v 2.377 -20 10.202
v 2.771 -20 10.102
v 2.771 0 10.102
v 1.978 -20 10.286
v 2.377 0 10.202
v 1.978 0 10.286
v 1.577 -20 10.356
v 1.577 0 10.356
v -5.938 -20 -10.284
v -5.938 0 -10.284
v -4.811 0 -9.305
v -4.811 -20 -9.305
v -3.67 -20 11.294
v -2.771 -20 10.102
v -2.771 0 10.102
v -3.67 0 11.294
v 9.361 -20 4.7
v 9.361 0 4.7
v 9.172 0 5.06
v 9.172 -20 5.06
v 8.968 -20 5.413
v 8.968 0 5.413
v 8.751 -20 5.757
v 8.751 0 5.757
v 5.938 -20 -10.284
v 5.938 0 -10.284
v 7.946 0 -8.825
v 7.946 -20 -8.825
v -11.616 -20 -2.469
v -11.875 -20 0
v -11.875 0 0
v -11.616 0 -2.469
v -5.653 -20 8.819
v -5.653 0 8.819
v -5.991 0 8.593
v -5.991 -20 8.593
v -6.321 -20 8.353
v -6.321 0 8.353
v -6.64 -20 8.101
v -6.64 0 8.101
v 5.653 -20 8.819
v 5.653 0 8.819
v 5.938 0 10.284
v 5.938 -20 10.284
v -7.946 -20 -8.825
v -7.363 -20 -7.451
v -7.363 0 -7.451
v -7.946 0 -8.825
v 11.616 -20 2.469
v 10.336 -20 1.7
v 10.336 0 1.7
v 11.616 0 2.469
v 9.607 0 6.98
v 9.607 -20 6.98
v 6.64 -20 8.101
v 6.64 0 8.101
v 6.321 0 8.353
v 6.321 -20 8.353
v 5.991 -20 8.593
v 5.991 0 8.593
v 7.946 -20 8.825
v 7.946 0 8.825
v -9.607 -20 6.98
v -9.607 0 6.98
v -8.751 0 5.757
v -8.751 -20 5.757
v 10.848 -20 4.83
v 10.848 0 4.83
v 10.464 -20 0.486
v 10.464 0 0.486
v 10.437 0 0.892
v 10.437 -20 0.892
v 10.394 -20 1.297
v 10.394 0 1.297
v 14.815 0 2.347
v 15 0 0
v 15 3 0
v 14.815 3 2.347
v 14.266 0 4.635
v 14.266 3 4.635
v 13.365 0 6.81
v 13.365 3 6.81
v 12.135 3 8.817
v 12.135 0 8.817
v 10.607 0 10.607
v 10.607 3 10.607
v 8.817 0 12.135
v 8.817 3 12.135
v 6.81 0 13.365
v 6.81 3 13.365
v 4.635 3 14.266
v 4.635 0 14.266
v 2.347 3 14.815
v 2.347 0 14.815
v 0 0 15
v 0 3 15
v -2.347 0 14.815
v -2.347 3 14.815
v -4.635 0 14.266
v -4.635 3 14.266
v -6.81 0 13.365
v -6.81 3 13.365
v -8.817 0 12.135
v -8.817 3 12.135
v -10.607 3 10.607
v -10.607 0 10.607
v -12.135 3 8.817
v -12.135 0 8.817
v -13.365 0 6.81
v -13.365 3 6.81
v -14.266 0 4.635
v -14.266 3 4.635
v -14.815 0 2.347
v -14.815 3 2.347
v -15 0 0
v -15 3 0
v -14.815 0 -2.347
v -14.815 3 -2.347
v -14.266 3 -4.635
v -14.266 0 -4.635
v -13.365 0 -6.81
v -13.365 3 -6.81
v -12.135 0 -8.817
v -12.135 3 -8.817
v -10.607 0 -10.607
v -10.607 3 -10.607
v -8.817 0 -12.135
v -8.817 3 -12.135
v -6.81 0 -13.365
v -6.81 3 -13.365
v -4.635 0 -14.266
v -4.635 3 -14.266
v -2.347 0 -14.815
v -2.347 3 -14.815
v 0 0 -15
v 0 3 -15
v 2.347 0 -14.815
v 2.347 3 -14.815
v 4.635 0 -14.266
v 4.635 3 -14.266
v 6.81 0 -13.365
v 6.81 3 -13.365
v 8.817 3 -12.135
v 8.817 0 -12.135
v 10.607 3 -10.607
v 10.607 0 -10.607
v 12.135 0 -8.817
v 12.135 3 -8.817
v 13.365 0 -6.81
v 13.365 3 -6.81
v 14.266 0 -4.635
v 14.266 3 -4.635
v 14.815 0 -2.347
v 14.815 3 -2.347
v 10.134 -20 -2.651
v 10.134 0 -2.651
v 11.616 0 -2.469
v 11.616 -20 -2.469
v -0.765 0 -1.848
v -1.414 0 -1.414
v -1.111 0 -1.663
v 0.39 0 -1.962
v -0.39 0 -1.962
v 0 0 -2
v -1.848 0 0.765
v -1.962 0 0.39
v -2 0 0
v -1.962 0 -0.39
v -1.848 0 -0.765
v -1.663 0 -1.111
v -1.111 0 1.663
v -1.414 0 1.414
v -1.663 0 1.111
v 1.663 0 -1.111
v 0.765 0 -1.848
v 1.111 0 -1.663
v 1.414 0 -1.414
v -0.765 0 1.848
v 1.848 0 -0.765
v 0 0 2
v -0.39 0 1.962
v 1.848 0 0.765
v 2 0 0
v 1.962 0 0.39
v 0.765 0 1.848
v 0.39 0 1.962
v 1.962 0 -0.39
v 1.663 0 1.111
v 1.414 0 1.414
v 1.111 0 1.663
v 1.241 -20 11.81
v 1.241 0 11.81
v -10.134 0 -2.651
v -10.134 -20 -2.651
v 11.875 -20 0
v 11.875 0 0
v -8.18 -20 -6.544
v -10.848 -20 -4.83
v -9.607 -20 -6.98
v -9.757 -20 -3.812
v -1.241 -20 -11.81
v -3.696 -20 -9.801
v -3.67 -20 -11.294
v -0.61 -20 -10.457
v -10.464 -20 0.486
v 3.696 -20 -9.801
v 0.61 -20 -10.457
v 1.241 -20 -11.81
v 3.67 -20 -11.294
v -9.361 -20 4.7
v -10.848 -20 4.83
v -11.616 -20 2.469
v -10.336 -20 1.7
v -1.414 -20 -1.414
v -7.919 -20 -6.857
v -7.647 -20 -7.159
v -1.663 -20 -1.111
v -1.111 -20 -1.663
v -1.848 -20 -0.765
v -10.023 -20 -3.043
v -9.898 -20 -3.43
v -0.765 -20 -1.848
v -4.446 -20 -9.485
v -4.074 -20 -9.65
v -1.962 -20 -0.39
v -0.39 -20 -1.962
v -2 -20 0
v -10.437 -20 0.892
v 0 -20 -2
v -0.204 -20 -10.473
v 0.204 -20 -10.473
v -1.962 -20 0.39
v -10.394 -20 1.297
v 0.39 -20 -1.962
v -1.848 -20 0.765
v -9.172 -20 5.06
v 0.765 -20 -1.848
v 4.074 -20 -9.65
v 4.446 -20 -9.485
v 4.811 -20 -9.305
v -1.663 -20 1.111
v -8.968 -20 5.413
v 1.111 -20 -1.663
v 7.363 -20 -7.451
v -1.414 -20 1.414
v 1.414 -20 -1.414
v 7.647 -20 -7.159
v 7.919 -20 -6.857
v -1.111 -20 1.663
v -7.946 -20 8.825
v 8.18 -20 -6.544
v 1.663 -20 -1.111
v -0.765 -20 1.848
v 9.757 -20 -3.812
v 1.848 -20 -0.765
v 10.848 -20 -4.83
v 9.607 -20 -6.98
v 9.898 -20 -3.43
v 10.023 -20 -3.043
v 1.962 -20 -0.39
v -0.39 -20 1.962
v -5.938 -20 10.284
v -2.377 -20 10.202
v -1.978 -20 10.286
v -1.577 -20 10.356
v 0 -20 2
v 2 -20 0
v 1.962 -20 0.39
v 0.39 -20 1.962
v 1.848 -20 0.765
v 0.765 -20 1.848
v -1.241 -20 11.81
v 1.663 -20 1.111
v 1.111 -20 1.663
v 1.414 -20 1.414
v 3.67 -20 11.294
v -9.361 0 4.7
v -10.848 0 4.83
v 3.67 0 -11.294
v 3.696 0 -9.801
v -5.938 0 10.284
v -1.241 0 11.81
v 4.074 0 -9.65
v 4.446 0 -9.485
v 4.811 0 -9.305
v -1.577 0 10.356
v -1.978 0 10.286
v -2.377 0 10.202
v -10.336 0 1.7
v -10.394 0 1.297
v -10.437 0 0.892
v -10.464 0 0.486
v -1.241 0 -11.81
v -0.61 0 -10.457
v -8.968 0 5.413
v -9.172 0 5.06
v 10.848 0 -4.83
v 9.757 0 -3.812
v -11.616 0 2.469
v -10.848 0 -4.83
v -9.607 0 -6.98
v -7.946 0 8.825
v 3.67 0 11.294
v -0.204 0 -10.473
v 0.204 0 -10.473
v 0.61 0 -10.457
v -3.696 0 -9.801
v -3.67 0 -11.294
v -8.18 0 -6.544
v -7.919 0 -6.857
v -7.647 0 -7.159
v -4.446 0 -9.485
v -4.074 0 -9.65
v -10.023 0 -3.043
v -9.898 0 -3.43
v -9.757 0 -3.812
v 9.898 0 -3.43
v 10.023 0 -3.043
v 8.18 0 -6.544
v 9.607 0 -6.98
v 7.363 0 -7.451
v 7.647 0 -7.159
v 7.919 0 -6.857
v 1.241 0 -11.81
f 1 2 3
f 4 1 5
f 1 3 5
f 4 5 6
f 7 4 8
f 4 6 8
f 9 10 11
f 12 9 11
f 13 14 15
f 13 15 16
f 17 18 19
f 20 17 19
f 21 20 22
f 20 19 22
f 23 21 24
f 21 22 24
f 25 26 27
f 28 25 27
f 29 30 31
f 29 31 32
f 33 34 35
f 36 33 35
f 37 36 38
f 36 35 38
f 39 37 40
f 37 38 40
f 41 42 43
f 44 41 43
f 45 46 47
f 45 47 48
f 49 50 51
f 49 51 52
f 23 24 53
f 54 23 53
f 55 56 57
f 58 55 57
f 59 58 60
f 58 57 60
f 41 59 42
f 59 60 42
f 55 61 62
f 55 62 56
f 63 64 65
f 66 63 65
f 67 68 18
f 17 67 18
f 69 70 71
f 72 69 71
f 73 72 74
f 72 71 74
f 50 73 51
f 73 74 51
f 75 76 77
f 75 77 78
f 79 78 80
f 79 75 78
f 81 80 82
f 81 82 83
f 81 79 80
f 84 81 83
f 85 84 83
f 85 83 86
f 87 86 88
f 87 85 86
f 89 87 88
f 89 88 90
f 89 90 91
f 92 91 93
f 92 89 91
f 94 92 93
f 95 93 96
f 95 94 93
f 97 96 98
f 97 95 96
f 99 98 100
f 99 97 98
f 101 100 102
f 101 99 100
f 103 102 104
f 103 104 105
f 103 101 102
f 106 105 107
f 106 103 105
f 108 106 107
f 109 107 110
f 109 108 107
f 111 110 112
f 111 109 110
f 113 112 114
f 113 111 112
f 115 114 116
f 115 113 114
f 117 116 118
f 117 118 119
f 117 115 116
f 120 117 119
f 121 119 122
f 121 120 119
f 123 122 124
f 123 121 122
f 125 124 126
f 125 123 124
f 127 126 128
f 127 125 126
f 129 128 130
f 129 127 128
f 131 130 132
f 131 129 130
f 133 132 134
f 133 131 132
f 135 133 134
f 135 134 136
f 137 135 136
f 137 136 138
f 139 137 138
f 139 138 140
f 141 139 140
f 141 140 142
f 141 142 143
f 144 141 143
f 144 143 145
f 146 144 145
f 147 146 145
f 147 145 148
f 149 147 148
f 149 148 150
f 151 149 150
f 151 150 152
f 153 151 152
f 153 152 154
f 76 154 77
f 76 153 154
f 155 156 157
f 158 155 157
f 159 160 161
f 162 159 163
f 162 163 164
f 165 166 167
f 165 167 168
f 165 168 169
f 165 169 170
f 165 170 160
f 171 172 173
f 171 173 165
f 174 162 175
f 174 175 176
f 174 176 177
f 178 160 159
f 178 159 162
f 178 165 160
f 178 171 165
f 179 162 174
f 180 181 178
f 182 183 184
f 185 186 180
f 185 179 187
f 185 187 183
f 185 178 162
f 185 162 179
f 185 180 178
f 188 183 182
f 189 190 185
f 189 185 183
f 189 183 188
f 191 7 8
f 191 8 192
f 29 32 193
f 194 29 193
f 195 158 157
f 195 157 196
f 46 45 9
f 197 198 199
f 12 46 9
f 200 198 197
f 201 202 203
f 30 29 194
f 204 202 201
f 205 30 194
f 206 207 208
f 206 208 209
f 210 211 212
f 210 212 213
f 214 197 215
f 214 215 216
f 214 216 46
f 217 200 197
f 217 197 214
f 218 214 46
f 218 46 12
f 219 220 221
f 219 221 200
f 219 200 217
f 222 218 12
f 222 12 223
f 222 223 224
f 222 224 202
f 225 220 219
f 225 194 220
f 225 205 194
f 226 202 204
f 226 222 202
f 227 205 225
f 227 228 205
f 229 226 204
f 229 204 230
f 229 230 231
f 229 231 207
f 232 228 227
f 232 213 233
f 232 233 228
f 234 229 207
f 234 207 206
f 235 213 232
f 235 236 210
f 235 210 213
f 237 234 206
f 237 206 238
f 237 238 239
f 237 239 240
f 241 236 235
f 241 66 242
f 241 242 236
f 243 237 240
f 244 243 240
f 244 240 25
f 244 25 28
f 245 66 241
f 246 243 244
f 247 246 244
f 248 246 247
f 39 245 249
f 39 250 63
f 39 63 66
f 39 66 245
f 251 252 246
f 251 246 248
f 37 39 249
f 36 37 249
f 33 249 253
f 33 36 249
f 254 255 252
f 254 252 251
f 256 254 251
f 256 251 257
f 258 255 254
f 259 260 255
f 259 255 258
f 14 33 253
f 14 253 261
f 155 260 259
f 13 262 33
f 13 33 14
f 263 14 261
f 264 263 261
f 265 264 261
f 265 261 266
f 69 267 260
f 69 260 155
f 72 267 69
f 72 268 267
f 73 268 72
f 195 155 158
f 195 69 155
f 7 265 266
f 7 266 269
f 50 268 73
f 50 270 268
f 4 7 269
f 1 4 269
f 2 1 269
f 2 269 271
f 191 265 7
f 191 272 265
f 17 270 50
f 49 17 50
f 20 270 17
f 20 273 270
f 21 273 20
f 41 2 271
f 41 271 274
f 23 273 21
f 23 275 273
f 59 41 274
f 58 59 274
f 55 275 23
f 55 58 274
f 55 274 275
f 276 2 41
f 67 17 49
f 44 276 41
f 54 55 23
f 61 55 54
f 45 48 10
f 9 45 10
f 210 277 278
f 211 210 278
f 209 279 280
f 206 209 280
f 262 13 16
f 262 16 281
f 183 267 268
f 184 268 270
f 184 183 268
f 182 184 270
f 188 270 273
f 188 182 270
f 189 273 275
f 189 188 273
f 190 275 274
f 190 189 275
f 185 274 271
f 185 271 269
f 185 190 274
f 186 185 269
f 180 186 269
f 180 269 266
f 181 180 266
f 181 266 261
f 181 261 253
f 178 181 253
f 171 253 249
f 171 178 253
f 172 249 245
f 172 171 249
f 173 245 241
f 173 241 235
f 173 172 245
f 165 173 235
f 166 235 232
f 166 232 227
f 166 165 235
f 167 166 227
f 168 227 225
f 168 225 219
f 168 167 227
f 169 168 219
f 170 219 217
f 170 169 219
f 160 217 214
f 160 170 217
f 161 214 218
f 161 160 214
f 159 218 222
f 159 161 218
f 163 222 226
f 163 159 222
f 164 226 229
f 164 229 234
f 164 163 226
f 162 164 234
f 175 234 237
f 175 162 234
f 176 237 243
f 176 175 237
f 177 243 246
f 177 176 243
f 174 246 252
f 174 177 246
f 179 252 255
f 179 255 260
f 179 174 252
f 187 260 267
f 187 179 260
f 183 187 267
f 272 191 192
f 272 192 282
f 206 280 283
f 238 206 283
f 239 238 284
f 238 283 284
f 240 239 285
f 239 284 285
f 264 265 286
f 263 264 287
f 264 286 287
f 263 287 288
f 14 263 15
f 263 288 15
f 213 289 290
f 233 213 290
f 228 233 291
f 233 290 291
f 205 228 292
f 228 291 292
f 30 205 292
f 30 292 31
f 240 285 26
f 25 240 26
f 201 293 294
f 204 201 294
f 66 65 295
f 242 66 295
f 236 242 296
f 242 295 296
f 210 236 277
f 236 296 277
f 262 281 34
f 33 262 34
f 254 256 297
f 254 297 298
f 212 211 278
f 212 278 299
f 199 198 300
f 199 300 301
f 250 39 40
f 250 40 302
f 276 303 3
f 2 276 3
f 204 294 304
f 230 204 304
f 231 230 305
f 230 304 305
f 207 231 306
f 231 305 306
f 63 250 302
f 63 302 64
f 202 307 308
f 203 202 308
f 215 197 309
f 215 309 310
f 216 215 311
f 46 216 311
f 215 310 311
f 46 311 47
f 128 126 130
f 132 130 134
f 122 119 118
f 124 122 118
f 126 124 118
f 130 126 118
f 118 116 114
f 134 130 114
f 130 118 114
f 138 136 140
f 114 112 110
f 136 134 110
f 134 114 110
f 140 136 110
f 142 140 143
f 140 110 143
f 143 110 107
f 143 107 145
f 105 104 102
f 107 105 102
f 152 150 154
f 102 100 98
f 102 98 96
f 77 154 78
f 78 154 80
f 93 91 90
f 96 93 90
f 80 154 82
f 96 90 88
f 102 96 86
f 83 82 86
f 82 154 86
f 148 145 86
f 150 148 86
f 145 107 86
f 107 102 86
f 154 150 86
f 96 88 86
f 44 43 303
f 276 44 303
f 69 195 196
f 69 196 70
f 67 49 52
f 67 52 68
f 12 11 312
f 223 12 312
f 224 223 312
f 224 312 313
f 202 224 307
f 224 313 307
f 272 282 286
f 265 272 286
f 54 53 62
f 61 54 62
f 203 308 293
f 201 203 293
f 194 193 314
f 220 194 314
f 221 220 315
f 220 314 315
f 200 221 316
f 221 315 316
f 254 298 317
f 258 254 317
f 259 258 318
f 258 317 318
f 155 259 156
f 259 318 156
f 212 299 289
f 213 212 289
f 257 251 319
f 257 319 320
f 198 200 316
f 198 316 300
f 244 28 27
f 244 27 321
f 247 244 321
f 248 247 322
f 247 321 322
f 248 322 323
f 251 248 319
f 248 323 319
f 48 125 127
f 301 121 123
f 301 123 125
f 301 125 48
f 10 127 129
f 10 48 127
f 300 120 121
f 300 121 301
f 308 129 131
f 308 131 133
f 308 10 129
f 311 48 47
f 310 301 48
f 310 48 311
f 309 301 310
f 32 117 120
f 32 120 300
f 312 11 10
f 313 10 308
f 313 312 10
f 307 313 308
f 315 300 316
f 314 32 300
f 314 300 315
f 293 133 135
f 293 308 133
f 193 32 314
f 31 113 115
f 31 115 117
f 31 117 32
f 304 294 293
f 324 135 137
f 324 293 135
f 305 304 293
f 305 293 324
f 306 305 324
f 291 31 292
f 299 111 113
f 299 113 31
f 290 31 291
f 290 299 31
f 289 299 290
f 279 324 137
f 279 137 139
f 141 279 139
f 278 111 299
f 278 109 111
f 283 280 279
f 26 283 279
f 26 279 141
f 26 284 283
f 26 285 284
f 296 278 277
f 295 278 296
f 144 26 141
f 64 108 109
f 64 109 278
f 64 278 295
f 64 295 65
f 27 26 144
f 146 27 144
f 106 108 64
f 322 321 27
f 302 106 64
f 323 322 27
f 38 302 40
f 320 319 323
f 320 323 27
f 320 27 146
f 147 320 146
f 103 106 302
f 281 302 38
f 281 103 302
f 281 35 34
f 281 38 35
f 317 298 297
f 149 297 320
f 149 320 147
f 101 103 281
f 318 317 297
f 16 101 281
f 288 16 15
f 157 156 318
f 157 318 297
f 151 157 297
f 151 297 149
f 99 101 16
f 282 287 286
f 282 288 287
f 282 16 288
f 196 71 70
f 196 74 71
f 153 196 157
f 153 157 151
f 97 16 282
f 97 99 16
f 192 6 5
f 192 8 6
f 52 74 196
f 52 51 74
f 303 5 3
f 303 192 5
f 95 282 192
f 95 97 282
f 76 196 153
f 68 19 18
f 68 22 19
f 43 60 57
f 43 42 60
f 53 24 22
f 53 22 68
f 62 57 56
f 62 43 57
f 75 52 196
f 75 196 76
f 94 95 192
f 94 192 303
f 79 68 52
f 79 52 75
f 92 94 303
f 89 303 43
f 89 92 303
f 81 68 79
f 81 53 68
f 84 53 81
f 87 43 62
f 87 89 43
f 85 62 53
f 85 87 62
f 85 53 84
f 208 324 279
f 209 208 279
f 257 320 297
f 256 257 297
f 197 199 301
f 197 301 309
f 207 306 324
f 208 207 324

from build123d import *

# Parameters (mm, degrees)
F0_R     = 2
F1_DEPTH = 20
F2_R     = 15
F3_DEPTH = 3


with BuildPart() as f1:
    # F0 (on Front) → F1 (new body)
    with BuildSketch(Plane.XZ):
        with BuildLine():
            ThreePointArc((10.134032, -2.650853), (10.389408, -1.336346), (10.475, 0))
            ThreePointArc((10.475, 0), (10.47218, 0.243036), (10.463722, 0.485942))
            ThreePointArc((10.463722, 0.485942), (10.417617, 1.094936), (10.336098, 1.700207))
            ThreePointArc((10.336098, 1.700207), (9.962317, 3.236953), (9.361436, 4.699909))
            ThreePointArc((9.361436, 4.699909), (9.071616, 5.2375), (8.750959, 5.757286))
            ThreePointArc((8.750959, 5.757286), (7.784442, 7.009143), (6.640472, 8.10122))
            ThreePointArc((6.640472, 8.10122), (6.157051, 8.474453), (5.652699, 8.818878))
            ThreePointArc((5.652699, 8.818878), (4.260566, 9.569389), (2.77131, 10.101756))
            ThreePointArc((2.77131, 10.101756), (2.177875, 10.246096), (1.577037, 10.355606))
            ThreePointArc((1.577037, 10.355606), (0, 10.475), (-1.577037, 10.355606))
            ThreePointArc((-1.577037, 10.355606), (-2.177875, 10.246096), (-2.77131, 10.101756))
            ThreePointArc((-2.77131, 10.101756), (-4.260566, 9.569389), (-5.652699, 8.818878))
            ThreePointArc((-5.652699, 8.818878), (-6.157051, 8.474453), (-6.640472, 8.10122))
            ThreePointArc((-6.640472, 8.10122), (-7.784442, 7.009143), (-8.750959, 5.757286))
            ThreePointArc((-8.750959, 5.757286), (-9.071616, 5.2375), (-9.361436, 4.699909))
            ThreePointArc((-9.361436, 4.699909), (-9.962317, 3.236953), (-10.336098, 1.700207))
            ThreePointArc((-10.336098, 1.700207), (-10.417617, 1.094936), (-10.463722, 0.485942))
            ThreePointArc((-10.463722, 0.485942), (-10.417617, -1.094936), (-10.134032, -2.650853))
            ThreePointArc((-10.134032, -2.650853), (-9.962317, -3.236953), (-9.756736, -3.812049))
            ThreePointArc((-9.756736, -3.812049), (-9.071616, -5.2375), (-8.1797, -6.543557))
            ThreePointArc((-8.1797, -6.543557), (-7.784442, -7.009143), (-7.362722, -7.450903))
            ThreePointArc((-7.362722, -7.450903), (-6.157051, -8.474453), (-4.811023, -9.30482))
            ThreePointArc((-4.811023, -9.30482), (-4.260566, -9.569389), (-3.695626, -9.801427))
            ThreePointArc((-3.695626, -9.801427), (-2.177875, -10.246096), (-0.610477, -10.457196))
            ThreePointArc((-0.610477, -10.457196), (0, -10.475), (0.610477, -10.457196))
            ThreePointArc((0.610477, -10.457196), (2.177875, -10.246096), (3.695626, -9.801427))
            ThreePointArc((3.695626, -9.801427), (4.260566, -9.569389), (4.811023, -9.30482))
            ThreePointArc((4.811023, -9.30482), (6.157051, -8.474453), (7.362722, -7.450903))
            ThreePointArc((7.362722, -7.450903), (7.784442, -7.009143), (8.1797, -6.543557))
            ThreePointArc((8.1797, -6.543557), (9.071616, -5.2375), (9.756736, -3.812049))
            ThreePointArc((9.756736, -3.812049), (9.962317, -3.236953), (10.134032, -2.650853))
        make_face()
        Circle(F0_R, mode=Mode.SUBTRACT)
        with BuildLine():
            ThreePointArc((10.463722, 0.485942), (10.47218, 0.243036), (10.475, 0))
            ThreePointArc((10.475, 0), (10.389408, -1.336346), (10.134032, -2.650853))
            Line((10.134032, -2.650853), (11.615503, -2.468951))
            Line((11.615503, -2.468951), (11.875, 0))
            Line((11.875, 0), (10.463722, 0.485942))
        make_face()
        with BuildLine():
            ThreePointArc((9.361436, 4.699909), (9.962317, 3.236953), (10.336098, 1.700207))
            Line((10.336098, 1.700207), (11.615503, 2.468951))
            Line((11.615503, 2.468951), (10.848352, 4.829998))
            Line((10.848352, 4.829998), (9.361436, 4.699909))
        make_face()
        with BuildLine():
            Line((10.848352, -4.829998), (9.756736, -3.812049))
            ThreePointArc((9.756736, -3.812049), (9.071616, -5.2375), (8.1797, -6.543557))
            Line((8.1797, -6.543557), (9.607077, -6.97995))
            Line((9.607077, -6.97995), (10.848352, -4.829998))
        make_face()
        with BuildLine():
            ThreePointArc((6.640472, 8.10122), (7.784442, 7.009143), (8.750959, 5.757286))
            Line((8.750959, 5.757286), (9.607077, 6.97995))
            Line((9.607077, 6.97995), (7.945926, 8.824845))
            Line((7.945926, 8.824845), (6.640472, 8.10122))
        make_face()
        with BuildLine():
            Line((7.945926, -8.824845), (7.362722, -7.450903))
            ThreePointArc((7.362722, -7.450903), (6.157051, -8.474453), (4.811023, -9.30482))
            Line((4.811023, -9.30482), (5.9375, -10.284052))
            Line((5.9375, -10.284052), (7.945926, -8.824845))
        make_face()
        with BuildLine():
            ThreePointArc((2.77131, 10.101756), (4.260566, 9.569389), (5.652699, 8.818878))
            Line((5.652699, 8.818878), (5.9375, 10.284052))
            Line((5.9375, 10.284052), (3.669577, 11.293796))
            Line((3.669577, 11.293796), (2.77131, 10.101756))
        make_face()
        with BuildLine():
            Line((3.669577, -11.293796), (3.695626, -9.801427))
            ThreePointArc((3.695626, -9.801427), (2.177875, -10.246096), (0.610477, -10.457196))
            Line((0.610477, -10.457196), (1.241276, -11.809948))
            Line((1.241276, -11.809948), (3.669577, -11.293796))
        make_face()
        with BuildLine():
            ThreePointArc((-1.577037, 10.355606), (0, 10.475), (1.577037, 10.355606))
            Line((1.577037, 10.355606), (1.241276, 11.809948))
            Line((1.241276, 11.809948), (-1.241276, 11.809948))
            Line((-1.241276, 11.809948), (-1.577037, 10.355606))
        make_face()
        with BuildLine():
            Line((-1.241276, -11.809948), (-0.610477, -10.457196))
            ThreePointArc((-0.610477, -10.457196), (-2.177875, -10.246096), (-3.695626, -9.801427))
            Line((-3.695626, -9.801427), (-3.669577, -11.293796))
            Line((-3.669577, -11.293796), (-1.241276, -11.809948))
        make_face()
        with BuildLine():
            ThreePointArc((-5.652699, 8.818878), (-4.260566, 9.569389), (-2.77131, 10.101756))
            Line((-2.77131, 10.101756), (-3.669577, 11.293796))
            Line((-3.669577, 11.293796), (-5.9375, 10.284052))
            Line((-5.9375, 10.284052), (-5.652699, 8.818878))
        make_face()
        with BuildLine():
            Line((-5.9375, -10.284052), (-4.811023, -9.30482))
            ThreePointArc((-4.811023, -9.30482), (-6.157051, -8.474453), (-7.362722, -7.450903))
            Line((-7.362722, -7.450903), (-7.945926, -8.824845))
            Line((-7.945926, -8.824845), (-5.9375, -10.284052))
        make_face()
        with BuildLine():
            ThreePointArc((-8.750959, 5.757286), (-7.784442, 7.009143), (-6.640472, 8.10122))
            Line((-6.640472, 8.10122), (-7.945926, 8.824845))
            Line((-7.945926, 8.824845), (-9.607077, 6.97995))
            Line((-9.607077, 6.97995), (-8.750959, 5.757286))
        make_face()
        with BuildLine():
            Line((-9.607077, -6.97995), (-8.1797, -6.543557))
            ThreePointArc((-8.1797, -6.543557), (-9.071616, -5.2375), (-9.756736, -3.812049))
            Line((-9.756736, -3.812049), (-10.848352, -4.829998))
            Line((-10.848352, -4.829998), (-9.607077, -6.97995))
        make_face()
        with BuildLine():
            ThreePointArc((-10.336098, 1.700207), (-9.962317, 3.236953), (-9.361436, 4.699909))
            Line((-9.361436, 4.699909), (-10.848352, 4.829998))
            Line((-10.848352, 4.829998), (-11.615503, 2.468951))
            Line((-11.615503, 2.468951), (-10.336098, 1.700207))
        make_face()
        with BuildLine():
            Line((-11.615503, -2.468951), (-10.134032, -2.650853))
            ThreePointArc((-10.134032, -2.650853), (-10.417617, -1.094936), (-10.463722, 0.485942))
            Line((-10.463722, 0.485942), (-11.875, 0))
            Line((-11.875, 0), (-11.615503, -2.468951))
        make_face()
    extrude(amount=F1_DEPTH)

    # F2 (on Front) → F3 (join)
    with BuildSketch(Plane.XZ):
        Circle(F2_R)
    extrude(amount=-F3_DEPTH)


solid = f1.part
